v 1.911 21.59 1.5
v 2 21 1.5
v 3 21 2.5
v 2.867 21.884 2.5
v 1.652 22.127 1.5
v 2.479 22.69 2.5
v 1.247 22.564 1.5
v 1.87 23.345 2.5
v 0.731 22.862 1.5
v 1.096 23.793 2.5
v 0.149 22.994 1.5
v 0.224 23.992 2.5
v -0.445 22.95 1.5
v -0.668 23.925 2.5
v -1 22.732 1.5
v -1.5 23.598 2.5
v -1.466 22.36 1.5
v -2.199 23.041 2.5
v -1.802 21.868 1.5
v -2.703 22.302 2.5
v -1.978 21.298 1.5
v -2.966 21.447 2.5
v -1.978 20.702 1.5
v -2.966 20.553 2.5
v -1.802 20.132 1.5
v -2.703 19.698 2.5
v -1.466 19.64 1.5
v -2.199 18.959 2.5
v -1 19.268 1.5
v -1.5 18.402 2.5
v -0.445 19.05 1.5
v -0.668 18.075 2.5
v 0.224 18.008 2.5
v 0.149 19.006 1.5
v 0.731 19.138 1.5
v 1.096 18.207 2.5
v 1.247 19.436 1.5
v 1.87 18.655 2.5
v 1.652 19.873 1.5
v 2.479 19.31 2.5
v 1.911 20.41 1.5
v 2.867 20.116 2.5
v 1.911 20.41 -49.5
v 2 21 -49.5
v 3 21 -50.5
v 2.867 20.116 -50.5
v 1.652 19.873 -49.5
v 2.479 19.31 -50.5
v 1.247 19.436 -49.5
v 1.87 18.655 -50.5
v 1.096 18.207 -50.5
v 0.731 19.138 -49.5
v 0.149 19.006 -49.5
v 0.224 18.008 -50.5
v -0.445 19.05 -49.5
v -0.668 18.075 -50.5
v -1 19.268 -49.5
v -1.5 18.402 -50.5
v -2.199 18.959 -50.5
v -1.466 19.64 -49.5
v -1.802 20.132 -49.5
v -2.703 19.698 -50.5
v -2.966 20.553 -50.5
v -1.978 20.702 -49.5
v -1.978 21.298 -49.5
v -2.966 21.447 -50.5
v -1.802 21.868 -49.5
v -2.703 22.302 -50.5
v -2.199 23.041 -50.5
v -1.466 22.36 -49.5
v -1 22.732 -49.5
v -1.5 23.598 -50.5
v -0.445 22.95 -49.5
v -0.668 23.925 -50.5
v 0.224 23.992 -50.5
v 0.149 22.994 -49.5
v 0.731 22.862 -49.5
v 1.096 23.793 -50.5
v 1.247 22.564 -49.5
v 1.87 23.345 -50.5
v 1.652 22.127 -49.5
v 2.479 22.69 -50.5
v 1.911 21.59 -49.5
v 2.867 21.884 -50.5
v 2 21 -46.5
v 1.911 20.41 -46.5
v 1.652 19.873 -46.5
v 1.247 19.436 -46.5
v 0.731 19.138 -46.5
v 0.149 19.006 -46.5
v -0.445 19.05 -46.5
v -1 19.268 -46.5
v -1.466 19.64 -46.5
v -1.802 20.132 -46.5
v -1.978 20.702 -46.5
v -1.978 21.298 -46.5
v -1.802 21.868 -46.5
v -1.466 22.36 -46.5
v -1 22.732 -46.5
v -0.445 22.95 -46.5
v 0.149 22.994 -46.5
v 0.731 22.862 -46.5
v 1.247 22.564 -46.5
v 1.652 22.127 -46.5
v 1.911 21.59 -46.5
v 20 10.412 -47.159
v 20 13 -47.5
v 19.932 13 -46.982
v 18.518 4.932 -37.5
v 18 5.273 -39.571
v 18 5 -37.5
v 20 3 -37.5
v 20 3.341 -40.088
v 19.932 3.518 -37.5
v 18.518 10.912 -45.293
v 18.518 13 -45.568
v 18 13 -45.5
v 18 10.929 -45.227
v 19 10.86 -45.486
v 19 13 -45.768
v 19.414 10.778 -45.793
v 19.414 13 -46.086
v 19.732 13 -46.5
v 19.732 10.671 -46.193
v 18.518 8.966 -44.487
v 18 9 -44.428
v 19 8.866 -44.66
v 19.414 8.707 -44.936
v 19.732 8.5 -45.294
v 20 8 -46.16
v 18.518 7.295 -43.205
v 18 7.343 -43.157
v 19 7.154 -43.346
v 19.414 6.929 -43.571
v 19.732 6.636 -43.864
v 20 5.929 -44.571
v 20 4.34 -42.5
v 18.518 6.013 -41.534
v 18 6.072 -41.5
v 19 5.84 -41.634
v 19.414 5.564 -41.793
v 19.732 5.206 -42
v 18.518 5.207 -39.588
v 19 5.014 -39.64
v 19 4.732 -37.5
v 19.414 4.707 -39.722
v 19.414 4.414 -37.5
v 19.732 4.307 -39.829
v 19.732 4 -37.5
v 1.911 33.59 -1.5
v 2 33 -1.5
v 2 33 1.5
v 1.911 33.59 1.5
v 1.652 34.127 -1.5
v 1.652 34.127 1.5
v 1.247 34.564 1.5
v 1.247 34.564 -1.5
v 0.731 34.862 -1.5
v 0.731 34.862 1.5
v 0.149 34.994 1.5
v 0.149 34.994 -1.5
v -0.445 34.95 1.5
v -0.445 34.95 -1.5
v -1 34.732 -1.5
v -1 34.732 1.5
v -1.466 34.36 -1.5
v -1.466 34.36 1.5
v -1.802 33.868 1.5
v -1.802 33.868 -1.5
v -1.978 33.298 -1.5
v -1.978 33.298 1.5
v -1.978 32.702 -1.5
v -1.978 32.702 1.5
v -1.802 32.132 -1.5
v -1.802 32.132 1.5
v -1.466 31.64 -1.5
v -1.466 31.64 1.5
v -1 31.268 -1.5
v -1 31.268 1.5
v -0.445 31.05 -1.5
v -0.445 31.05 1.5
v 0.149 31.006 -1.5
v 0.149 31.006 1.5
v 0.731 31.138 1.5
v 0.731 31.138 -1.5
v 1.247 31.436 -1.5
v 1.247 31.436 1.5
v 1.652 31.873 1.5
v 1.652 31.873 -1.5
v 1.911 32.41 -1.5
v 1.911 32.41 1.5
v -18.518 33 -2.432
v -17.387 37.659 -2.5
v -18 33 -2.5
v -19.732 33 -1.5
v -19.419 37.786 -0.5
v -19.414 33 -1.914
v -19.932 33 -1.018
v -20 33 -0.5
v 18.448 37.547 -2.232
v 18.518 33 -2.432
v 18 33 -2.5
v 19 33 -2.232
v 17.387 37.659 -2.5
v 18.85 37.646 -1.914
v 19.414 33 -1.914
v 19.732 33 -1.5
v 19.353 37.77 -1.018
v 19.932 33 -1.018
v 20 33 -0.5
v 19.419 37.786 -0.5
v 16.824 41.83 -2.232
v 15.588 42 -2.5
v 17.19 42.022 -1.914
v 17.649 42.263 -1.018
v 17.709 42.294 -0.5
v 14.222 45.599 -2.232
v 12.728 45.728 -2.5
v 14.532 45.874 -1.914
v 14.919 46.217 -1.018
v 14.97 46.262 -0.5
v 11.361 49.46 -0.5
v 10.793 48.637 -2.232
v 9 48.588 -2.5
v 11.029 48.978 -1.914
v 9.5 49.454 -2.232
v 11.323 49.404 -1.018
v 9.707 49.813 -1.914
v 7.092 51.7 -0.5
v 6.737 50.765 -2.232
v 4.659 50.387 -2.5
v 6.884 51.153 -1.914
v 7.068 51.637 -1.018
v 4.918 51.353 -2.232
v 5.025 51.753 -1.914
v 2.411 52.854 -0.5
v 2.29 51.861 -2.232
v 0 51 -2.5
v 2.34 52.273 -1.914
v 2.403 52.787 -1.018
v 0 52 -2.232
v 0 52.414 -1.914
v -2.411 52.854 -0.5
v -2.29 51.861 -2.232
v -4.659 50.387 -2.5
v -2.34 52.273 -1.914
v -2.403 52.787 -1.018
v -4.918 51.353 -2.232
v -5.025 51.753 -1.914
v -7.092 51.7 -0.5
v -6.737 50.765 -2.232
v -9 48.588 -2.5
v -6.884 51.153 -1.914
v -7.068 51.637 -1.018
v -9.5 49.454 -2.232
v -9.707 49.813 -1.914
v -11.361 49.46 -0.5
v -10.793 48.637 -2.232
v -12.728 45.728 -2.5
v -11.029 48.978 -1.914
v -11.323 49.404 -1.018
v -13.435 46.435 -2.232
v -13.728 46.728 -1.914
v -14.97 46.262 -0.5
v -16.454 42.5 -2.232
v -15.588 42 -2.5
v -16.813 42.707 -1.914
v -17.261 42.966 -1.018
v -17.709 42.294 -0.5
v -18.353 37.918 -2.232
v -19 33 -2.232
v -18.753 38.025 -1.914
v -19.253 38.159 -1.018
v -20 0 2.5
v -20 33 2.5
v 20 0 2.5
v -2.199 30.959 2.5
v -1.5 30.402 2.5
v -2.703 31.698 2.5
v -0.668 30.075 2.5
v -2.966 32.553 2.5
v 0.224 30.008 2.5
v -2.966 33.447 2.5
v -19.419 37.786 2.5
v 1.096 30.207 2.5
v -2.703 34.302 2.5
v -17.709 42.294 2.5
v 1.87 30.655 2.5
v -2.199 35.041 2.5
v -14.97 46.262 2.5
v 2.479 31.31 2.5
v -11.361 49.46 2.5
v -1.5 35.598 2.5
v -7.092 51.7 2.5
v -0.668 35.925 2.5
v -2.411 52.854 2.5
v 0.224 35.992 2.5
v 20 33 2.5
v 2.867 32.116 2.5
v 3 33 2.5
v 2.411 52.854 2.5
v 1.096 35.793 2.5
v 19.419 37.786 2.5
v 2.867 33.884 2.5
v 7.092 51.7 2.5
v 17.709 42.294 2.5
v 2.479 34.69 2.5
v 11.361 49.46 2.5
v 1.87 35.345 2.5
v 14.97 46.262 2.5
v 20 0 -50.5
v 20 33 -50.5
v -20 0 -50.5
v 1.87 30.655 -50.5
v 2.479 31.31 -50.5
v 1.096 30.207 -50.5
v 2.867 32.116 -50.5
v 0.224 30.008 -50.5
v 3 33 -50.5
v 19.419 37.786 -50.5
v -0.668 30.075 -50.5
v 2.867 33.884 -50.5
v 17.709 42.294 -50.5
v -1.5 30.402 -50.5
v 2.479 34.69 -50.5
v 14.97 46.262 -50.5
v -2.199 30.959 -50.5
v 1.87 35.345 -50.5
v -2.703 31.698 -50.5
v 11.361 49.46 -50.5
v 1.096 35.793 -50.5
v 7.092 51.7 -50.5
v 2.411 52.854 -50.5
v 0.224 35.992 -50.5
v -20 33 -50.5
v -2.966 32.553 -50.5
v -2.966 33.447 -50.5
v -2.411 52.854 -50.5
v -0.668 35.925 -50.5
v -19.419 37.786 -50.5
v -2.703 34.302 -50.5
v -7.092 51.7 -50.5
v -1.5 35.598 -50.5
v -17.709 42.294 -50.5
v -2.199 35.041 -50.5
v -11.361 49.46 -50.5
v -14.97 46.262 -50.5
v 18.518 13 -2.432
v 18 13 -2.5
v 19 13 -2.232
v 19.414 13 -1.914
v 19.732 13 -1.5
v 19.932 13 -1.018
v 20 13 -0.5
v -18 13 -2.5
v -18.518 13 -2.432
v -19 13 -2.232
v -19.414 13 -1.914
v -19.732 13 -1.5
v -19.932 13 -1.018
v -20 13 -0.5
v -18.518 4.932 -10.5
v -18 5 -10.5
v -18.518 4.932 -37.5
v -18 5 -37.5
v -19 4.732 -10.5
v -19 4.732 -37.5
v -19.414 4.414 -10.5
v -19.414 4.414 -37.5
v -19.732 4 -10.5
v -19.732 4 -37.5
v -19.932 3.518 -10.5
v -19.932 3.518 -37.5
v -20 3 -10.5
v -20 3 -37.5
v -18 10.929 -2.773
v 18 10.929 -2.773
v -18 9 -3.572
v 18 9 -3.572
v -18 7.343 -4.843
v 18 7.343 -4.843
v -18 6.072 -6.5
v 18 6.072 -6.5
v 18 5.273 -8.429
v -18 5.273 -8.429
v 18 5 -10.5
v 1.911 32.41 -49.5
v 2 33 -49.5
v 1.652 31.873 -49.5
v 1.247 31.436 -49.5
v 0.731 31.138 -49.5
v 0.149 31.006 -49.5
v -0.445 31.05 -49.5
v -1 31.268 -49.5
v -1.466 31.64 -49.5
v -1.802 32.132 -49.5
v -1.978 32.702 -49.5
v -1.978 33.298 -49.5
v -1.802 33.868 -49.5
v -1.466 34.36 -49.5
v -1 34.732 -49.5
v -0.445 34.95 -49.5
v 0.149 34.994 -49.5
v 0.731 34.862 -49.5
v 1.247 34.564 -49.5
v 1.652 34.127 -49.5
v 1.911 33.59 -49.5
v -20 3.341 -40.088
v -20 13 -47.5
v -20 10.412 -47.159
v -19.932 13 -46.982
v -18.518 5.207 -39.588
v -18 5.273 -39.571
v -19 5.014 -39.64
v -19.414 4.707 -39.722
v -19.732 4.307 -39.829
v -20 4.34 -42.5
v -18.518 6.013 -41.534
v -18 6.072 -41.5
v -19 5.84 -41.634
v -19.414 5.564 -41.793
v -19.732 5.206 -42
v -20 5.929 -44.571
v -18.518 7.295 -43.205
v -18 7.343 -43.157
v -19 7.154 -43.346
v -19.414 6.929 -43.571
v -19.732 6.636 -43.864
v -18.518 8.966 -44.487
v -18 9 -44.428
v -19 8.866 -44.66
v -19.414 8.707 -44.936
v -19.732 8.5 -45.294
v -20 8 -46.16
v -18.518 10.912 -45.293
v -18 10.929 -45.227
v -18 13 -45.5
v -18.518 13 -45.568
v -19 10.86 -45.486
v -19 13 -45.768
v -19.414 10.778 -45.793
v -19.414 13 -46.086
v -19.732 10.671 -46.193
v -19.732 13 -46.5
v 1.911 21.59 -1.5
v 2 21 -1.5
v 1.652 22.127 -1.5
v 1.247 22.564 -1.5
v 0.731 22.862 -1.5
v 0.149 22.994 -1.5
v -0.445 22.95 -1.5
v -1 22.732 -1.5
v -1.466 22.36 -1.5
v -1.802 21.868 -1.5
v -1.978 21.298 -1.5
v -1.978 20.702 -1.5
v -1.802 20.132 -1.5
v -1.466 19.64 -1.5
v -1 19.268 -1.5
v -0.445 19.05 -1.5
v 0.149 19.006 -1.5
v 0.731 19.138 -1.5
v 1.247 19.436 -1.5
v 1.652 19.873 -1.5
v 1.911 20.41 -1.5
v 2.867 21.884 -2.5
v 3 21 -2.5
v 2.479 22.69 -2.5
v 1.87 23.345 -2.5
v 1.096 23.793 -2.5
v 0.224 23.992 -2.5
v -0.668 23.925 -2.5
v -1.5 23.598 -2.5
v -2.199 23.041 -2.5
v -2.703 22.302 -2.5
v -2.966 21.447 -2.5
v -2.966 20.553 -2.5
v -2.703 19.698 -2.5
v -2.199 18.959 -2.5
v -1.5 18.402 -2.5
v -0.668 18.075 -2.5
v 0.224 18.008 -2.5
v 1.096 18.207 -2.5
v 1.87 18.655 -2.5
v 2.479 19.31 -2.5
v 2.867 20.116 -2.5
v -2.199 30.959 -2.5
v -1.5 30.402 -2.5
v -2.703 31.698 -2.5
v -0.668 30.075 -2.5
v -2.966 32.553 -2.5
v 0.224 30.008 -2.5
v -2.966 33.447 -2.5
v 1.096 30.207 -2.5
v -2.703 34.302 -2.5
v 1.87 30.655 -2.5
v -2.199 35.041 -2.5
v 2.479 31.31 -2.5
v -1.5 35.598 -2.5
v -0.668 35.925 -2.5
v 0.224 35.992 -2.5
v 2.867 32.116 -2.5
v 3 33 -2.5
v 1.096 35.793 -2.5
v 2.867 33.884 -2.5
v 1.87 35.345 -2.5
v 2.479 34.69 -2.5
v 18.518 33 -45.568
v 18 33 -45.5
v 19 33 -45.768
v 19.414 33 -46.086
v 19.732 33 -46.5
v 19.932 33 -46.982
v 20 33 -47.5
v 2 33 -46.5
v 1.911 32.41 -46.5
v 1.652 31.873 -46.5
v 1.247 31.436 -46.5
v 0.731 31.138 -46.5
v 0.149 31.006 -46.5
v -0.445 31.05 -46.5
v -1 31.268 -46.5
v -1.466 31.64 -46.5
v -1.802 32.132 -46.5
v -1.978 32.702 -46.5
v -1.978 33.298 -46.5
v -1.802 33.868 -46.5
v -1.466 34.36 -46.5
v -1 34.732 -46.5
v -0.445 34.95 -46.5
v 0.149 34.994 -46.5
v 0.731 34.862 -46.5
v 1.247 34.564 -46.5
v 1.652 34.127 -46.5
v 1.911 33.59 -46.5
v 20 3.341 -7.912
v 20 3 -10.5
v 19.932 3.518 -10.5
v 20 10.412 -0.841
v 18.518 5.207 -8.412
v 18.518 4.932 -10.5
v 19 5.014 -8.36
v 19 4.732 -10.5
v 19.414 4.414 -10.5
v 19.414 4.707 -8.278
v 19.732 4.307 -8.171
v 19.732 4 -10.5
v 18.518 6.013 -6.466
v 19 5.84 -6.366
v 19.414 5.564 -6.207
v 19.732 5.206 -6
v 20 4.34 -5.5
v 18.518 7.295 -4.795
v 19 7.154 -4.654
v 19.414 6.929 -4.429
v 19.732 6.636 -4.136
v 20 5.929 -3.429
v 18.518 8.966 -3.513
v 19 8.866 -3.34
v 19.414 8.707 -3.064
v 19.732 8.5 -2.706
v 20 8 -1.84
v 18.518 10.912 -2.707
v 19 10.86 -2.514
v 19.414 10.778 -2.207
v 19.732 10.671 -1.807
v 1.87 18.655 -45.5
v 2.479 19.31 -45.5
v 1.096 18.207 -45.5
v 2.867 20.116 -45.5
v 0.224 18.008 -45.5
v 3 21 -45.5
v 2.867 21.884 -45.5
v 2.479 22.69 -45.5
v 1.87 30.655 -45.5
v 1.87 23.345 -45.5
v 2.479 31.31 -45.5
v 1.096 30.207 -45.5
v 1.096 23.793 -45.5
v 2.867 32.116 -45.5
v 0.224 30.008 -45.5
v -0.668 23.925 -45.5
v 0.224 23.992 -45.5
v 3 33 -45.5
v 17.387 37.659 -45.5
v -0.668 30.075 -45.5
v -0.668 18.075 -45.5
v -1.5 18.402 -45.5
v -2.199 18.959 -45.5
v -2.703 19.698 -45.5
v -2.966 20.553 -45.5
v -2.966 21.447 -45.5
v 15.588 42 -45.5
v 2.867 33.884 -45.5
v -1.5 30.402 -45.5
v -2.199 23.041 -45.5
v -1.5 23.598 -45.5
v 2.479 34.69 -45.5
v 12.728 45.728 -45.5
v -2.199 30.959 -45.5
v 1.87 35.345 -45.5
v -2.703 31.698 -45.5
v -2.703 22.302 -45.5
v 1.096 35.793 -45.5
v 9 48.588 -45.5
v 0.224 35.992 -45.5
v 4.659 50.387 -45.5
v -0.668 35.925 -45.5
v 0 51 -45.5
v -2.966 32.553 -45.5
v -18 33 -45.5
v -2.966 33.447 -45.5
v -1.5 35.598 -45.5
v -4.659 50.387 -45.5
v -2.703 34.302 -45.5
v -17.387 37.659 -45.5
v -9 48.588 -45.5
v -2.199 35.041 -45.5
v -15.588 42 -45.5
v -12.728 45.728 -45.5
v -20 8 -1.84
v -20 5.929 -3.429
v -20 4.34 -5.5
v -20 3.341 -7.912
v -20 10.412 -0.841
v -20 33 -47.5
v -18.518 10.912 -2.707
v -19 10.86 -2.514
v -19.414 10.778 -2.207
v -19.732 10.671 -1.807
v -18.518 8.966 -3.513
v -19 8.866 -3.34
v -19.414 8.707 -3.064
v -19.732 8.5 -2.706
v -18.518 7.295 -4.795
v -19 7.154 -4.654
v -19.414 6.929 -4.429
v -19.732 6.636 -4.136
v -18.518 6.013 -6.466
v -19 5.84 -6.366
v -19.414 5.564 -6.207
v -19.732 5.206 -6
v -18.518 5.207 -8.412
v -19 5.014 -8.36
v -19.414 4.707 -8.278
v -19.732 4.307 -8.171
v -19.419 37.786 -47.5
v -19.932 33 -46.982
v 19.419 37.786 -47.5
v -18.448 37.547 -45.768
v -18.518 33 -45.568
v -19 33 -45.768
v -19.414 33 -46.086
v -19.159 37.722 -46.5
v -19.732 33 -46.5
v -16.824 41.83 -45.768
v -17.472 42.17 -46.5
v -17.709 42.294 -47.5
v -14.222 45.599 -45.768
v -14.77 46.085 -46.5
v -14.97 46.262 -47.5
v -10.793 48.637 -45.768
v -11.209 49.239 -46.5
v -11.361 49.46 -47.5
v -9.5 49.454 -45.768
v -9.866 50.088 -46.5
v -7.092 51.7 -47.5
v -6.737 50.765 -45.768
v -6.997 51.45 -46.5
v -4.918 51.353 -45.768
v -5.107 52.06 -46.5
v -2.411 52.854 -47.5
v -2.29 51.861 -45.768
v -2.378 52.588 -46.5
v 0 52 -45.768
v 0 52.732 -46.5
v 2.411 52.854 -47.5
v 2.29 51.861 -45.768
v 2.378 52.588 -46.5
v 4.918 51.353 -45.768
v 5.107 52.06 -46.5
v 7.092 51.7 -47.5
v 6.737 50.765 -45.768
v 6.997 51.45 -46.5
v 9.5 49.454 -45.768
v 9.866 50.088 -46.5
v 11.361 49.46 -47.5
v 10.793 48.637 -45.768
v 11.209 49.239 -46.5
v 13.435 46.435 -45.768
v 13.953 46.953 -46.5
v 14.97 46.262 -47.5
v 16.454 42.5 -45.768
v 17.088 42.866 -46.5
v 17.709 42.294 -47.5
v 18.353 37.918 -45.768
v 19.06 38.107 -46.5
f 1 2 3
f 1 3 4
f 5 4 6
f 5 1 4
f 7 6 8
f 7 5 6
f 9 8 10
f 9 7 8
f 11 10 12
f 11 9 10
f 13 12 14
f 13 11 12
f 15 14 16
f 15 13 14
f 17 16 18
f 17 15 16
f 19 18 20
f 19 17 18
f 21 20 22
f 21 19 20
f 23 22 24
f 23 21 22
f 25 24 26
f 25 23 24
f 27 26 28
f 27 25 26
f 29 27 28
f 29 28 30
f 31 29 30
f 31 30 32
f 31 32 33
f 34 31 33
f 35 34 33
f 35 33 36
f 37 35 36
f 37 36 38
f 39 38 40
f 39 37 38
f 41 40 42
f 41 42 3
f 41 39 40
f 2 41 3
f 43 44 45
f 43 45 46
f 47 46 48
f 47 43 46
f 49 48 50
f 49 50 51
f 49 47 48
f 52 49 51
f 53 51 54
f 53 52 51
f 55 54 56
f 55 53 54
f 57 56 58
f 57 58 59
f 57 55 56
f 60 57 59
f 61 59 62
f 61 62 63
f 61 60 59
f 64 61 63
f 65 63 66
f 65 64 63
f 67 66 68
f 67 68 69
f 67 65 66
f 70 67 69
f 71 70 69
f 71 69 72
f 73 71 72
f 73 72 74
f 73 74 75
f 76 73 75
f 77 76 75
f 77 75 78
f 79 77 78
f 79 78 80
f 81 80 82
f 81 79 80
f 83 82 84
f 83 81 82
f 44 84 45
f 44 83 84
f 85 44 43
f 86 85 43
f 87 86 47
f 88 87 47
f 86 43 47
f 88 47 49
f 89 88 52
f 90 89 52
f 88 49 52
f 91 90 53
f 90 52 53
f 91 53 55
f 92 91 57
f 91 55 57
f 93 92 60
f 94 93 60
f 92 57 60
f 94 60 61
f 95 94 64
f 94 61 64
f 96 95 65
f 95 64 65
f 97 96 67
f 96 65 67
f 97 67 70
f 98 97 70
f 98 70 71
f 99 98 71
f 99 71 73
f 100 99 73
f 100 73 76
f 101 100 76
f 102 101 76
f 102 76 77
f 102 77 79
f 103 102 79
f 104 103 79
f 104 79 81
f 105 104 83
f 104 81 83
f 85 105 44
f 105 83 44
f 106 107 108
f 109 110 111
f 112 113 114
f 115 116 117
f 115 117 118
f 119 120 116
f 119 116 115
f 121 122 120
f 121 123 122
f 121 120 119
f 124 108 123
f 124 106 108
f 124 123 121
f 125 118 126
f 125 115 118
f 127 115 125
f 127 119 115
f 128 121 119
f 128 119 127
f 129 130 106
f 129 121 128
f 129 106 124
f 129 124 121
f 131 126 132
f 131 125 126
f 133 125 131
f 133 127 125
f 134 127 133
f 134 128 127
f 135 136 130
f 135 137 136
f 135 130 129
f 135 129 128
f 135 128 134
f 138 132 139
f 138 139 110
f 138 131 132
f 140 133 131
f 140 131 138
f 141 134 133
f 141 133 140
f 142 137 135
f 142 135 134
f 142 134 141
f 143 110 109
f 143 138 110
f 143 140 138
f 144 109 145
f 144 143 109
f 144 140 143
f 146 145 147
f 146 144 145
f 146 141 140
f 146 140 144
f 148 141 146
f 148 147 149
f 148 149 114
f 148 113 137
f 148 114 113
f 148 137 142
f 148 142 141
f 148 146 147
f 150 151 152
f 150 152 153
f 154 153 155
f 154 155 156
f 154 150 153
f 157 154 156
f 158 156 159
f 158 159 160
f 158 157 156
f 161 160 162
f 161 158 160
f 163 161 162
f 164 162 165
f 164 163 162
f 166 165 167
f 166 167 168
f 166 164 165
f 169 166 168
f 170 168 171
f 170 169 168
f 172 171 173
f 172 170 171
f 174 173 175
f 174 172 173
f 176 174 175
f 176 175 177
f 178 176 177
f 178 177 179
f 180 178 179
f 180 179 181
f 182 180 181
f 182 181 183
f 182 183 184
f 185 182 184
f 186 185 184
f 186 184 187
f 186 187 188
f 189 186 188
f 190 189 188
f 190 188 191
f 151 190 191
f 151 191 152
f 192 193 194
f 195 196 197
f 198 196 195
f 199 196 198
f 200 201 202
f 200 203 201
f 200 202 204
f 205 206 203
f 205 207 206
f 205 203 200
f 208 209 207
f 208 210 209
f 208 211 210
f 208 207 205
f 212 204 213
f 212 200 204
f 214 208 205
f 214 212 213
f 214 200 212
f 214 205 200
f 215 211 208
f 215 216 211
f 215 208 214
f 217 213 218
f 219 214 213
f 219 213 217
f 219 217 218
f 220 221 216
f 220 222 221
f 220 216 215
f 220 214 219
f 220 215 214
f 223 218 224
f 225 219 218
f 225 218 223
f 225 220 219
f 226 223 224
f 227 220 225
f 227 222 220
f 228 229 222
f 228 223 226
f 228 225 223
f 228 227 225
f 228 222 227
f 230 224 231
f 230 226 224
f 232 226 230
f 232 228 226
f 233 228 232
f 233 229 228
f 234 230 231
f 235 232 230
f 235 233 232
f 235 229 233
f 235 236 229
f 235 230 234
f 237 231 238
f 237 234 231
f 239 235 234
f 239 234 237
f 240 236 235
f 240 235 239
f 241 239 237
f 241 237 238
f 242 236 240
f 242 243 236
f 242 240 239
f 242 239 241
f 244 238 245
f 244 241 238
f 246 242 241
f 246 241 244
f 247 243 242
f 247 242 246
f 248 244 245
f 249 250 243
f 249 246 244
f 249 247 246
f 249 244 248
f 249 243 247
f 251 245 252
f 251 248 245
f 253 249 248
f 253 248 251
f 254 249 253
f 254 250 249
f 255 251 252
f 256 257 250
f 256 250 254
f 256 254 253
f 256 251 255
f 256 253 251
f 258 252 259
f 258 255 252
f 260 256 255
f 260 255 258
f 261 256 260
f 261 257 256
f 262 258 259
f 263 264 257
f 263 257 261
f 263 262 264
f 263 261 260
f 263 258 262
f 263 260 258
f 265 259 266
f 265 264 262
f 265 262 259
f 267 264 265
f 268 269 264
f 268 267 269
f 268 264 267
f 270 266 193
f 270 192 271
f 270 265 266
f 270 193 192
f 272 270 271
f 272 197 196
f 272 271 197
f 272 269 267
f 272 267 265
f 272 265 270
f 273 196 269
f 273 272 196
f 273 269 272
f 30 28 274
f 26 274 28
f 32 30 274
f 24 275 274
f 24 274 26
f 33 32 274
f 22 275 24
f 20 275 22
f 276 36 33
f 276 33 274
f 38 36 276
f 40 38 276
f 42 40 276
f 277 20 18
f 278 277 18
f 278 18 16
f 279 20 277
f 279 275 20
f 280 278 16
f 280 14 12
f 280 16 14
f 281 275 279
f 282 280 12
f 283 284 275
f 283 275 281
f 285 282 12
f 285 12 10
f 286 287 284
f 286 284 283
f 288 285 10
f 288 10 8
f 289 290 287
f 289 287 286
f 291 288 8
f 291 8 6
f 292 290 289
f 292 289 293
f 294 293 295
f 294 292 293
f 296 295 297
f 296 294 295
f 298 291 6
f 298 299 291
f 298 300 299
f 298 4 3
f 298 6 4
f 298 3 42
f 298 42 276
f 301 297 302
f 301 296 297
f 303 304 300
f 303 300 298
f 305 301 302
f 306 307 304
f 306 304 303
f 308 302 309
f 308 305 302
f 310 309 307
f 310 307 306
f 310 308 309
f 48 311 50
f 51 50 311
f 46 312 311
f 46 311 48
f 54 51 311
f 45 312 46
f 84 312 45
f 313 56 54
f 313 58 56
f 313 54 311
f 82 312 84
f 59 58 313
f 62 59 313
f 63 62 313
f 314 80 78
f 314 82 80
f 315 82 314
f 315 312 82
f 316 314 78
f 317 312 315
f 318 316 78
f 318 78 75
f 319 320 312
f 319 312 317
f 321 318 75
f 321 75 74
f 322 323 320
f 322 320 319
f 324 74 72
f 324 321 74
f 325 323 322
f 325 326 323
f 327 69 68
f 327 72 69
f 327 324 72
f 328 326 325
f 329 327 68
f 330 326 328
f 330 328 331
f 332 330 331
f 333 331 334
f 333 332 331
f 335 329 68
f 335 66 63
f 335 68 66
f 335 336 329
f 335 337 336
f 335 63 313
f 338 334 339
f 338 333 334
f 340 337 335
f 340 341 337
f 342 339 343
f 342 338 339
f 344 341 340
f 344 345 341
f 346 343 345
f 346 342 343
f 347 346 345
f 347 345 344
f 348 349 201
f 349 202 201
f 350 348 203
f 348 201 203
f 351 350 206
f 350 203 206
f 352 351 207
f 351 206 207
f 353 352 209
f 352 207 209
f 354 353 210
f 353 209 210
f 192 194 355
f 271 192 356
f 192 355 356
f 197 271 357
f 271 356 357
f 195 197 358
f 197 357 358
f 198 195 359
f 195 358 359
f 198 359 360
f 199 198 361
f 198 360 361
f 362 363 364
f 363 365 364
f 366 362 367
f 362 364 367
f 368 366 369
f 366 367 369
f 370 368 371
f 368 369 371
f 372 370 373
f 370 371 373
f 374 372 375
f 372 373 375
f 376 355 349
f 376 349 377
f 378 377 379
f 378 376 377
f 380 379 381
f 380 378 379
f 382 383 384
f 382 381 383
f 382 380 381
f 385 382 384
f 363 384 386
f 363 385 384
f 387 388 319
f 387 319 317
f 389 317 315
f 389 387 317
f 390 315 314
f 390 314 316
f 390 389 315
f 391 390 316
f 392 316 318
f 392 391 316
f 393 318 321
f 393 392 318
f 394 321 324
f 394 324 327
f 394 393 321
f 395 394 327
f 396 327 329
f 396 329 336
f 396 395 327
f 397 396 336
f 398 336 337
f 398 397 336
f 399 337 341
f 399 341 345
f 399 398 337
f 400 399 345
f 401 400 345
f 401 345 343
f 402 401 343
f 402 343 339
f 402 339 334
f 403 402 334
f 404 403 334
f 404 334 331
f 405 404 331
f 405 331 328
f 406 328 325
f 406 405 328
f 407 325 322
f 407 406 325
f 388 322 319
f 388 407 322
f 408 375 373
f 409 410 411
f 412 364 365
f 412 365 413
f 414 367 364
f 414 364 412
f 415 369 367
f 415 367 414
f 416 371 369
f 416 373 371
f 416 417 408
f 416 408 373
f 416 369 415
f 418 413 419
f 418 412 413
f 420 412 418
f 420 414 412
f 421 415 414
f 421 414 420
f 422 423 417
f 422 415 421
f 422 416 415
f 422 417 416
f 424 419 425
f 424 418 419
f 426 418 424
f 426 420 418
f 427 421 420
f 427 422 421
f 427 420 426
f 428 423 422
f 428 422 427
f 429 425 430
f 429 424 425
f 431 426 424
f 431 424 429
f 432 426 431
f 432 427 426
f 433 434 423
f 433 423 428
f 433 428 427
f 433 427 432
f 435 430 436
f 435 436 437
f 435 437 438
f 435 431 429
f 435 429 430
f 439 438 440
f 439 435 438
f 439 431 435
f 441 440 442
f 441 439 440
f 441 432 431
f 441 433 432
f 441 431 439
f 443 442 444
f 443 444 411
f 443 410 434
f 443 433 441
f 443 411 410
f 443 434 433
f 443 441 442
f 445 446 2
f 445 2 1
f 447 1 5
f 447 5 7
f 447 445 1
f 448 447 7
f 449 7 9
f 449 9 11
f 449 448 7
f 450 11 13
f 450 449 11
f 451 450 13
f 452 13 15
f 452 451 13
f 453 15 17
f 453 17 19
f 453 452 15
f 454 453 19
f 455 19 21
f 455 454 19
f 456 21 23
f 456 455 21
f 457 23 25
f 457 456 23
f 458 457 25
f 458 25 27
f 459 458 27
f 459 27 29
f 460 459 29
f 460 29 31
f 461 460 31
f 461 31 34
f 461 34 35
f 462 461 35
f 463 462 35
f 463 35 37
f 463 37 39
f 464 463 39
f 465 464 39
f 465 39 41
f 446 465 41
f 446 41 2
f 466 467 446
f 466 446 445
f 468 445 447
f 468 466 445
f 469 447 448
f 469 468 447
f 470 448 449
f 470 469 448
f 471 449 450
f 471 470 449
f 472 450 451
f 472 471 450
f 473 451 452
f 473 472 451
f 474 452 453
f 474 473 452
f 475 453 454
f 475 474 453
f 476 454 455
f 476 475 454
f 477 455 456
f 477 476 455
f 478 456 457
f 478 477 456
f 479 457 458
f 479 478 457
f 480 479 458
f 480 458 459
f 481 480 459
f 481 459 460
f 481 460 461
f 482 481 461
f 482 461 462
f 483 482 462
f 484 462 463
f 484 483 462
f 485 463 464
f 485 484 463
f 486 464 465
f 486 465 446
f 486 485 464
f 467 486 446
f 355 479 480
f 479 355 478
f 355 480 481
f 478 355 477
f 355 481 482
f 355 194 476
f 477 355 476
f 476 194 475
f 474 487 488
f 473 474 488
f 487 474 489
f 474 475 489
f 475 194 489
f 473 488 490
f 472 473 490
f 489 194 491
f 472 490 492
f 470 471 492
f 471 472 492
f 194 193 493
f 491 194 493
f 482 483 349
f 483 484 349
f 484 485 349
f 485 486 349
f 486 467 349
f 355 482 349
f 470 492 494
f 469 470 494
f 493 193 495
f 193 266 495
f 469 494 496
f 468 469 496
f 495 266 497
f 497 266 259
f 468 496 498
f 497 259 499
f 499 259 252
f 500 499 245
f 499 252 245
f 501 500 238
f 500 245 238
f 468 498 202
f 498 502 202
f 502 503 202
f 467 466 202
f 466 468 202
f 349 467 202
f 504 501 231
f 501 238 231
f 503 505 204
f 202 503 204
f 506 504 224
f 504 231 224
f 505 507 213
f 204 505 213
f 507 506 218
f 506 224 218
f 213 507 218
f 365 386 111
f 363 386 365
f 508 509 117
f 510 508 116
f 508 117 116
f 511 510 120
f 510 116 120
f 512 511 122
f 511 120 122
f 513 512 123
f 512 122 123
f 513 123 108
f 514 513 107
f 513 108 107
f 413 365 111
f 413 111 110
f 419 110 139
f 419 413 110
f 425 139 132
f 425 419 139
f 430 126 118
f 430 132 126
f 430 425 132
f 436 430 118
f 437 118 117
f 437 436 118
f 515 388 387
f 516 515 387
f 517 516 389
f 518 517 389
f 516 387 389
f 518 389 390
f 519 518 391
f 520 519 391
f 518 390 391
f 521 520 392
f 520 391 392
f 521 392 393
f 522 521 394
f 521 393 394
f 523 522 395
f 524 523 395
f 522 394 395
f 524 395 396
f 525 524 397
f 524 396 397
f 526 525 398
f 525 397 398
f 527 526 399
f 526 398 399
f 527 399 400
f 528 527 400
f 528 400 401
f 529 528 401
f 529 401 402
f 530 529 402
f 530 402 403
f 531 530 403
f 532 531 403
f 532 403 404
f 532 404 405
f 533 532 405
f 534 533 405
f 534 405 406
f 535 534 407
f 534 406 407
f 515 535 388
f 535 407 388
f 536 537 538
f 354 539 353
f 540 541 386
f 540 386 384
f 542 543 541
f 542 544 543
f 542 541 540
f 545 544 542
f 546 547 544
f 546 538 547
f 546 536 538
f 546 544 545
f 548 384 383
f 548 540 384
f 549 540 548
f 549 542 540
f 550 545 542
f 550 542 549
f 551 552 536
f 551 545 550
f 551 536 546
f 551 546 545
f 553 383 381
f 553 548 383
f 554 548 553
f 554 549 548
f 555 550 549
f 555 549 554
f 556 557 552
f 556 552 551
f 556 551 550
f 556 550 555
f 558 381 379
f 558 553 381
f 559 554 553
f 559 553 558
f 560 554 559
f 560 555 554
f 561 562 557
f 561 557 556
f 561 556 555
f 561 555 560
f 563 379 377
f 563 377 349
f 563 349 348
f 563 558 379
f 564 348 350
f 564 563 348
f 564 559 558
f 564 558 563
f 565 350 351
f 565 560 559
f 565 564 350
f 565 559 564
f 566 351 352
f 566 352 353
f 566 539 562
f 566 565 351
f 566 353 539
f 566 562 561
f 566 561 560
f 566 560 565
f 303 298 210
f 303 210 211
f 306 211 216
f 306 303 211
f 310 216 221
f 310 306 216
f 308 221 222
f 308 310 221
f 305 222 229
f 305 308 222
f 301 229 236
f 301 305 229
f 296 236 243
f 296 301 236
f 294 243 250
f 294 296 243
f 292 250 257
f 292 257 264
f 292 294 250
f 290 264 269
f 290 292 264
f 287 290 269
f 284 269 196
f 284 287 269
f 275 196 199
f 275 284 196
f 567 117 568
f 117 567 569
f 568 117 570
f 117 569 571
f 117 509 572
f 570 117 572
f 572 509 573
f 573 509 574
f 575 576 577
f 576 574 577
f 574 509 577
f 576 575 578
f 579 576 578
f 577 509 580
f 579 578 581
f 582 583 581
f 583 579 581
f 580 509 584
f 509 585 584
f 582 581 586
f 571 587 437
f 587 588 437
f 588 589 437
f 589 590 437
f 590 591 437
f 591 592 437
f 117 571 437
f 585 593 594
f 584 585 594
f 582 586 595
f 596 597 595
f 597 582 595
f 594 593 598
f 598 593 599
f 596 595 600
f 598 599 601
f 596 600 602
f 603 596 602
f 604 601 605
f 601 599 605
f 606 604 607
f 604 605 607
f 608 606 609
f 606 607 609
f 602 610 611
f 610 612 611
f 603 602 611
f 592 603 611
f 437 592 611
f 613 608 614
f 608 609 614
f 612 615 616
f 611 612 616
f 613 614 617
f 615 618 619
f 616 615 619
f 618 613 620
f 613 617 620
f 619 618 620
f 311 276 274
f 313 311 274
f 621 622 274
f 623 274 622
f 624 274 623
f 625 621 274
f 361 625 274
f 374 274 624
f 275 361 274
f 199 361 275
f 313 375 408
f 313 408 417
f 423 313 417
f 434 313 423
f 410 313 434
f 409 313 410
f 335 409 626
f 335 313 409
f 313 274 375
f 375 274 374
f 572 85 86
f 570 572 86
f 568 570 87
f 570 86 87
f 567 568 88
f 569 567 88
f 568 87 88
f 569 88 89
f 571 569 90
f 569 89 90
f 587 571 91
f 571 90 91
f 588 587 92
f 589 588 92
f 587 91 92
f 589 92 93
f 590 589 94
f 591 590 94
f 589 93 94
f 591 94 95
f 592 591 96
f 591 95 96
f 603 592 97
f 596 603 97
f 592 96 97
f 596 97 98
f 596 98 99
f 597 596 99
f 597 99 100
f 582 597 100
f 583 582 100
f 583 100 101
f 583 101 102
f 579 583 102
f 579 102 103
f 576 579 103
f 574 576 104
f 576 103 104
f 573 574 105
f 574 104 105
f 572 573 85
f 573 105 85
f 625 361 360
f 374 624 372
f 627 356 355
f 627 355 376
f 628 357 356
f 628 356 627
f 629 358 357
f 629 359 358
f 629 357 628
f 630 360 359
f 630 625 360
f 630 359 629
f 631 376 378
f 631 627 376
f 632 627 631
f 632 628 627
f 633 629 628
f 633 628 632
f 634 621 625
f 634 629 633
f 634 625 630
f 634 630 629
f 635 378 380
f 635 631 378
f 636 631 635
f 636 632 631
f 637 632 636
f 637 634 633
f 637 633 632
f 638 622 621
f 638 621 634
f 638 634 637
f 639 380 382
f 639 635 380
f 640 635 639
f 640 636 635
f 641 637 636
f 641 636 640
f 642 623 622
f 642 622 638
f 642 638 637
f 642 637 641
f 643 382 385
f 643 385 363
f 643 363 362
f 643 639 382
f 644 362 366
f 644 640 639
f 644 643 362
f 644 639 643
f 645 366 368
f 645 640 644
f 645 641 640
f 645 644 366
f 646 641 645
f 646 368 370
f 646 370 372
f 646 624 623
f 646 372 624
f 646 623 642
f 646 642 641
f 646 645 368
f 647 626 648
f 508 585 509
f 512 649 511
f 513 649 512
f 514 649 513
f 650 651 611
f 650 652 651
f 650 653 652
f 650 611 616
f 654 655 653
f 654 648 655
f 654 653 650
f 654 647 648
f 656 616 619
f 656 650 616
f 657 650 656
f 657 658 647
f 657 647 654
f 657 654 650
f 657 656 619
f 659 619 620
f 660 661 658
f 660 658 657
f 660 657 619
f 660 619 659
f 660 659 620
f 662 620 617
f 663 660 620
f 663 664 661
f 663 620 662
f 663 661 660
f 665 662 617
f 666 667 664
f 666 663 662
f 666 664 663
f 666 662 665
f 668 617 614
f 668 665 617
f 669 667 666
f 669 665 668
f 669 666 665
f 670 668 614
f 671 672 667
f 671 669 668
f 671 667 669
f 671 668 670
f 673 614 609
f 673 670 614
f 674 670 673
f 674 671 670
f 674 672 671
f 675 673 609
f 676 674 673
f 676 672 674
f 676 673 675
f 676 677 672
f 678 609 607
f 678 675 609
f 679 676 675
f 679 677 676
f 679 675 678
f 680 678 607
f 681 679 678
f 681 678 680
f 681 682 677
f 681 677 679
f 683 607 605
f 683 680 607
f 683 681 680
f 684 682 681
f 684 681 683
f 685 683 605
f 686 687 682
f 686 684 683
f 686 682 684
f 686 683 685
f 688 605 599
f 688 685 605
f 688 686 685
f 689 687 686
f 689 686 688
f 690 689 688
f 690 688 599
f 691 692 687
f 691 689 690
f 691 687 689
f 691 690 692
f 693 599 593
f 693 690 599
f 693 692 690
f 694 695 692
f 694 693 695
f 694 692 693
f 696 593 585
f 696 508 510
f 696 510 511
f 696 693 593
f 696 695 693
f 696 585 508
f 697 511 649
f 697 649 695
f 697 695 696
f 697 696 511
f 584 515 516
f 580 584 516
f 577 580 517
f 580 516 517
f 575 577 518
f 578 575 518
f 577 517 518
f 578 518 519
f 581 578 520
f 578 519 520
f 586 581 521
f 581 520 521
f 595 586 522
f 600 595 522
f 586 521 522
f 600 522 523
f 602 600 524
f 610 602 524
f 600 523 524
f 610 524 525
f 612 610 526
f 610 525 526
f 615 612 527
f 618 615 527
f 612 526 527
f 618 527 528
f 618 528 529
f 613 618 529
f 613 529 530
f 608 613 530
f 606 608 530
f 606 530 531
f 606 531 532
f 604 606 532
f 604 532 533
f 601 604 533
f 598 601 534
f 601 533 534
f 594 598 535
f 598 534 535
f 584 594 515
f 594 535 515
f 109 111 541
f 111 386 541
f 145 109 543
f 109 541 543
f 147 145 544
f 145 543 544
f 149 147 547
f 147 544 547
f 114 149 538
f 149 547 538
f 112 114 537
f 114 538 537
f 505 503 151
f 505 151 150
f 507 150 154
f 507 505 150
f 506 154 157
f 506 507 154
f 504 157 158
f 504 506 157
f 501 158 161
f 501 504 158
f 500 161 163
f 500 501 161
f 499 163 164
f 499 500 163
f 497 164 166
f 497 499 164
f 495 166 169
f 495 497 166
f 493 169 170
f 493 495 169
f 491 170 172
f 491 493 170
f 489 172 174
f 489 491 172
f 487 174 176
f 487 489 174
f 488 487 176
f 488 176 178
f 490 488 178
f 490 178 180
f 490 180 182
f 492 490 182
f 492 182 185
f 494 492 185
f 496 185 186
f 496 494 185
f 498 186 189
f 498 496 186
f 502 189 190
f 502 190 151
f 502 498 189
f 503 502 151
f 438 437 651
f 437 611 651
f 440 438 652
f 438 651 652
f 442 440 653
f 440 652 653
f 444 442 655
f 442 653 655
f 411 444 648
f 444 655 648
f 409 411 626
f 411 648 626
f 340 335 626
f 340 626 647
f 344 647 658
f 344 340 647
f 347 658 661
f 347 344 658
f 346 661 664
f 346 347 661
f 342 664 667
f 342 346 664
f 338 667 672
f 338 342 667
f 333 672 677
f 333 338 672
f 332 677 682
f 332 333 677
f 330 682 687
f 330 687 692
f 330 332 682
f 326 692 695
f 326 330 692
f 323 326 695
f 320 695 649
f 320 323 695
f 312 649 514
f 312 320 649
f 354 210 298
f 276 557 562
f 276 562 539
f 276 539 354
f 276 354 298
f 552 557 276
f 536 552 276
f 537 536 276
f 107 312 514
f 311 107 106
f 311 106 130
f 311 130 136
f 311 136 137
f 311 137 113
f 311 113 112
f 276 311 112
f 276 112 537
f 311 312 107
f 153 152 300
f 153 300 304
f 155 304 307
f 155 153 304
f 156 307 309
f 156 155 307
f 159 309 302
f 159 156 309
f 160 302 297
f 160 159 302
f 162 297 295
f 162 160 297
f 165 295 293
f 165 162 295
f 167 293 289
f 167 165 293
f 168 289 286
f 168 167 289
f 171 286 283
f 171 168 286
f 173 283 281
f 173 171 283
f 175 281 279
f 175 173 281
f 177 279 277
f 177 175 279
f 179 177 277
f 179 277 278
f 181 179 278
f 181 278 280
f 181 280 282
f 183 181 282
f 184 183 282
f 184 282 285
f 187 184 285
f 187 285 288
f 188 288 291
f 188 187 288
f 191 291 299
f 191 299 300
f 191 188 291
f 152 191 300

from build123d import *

# Parameters (mm, degrees)
SKETCH1_R           = 2
BOSS_EXTRUDE1_DEPTH = 2.5
BOSS_EXTRUDE2_START = -5
SKETCH2_W           = 40
SKETCH2_H           = 5
BOSS_EXTRUDE2_DEPTH = 53
SKETCH3_R           = 2
BOSS_EXTRUDE3_DEPTH = 5
FILLET2_R           = 8
FILLET1_R           = 2
CHAMFER1_SIZE       = 1


with BuildPart() as part:
    # Sketch1 → Boss-Extrude1 (new, symmetric)
    with BuildSketch(Plane.XY):
        with BuildLine():
            Line((-20, 0), (20, 0))
            Line((20, 0), (20, 33))
            ThreePointArc((20, 33), (0, 53), (-20, 33))
            Line((-20, 33), (-20, 0))
        make_face()
        with Locations((0, 33)):
            Circle(SKETCH1_R, mode=Mode.SUBTRACT)
        with Locations((0, 21)):
            Circle(SKETCH1_R, mode=Mode.SUBTRACT)
    extrude(amount=BOSS_EXTRUDE1_DEPTH, both=True)

    # Sketch2 → Boss-Extrude2 (add)
    with BuildSketch(Plane(origin=(0, 0, -2.5), x_dir=(-1, 0, 0), z_dir=(0, 0, -1)).offset(BOSS_EXTRUDE2_START)):
        with Locations((0, 2.5)):
            Rectangle(SKETCH2_W, SKETCH2_H)
    extrude(amount=BOSS_EXTRUDE2_DEPTH)

    # Sketch3 → Boss-Extrude3 (add)
    with BuildSketch(Plane(origin=(0, 0, -50.5), x_dir=(-1, 0, 0), z_dir=(0, 0, -1))):
        with BuildLine():
            Line((-20, 33), (-20, 5))
            Line((-20, 5), (20, 5))
            Line((20, 5), (20, 33))
            ThreePointArc((20, 33), (0, 53), (-20, 33))
        make_face()
        with Locations(Location((0, 21, 0), (0, 0, 180))):
            Circle(SKETCH3_R, mode=Mode.SUBTRACT)
        with Locations(Location((0, 33, 0), (0, 0, 180))):
            Circle(SKETCH3_R, mode=Mode.SUBTRACT)
    extrude(amount=-BOSS_EXTRUDE3_DEPTH)

    # Fillet2
    fillet2_edges = [part.edges().sort_by_distance(p)[0] for p in [
        (0, 5, -2.5),
        (0, 5, -45.5),
    ]]
    fillet(fillet2_edges, radius=FILLET2_R)

    # Fillet1
    fillet1_edges = [part.edges().sort_by_distance(p)[0] for p in [
        (0, 53, -45.5),
        (20, 23, -45.5),
        (-20, 23, -2.5),
        (-20, 5, -24),
        (20, 5, -24),
        (0, 53, -2.5),
        (-20, 23, -45.5),
        (20, 23, -2.5),
        (-20, 7.343145751, -43.156854249),
        (20, 7.343145751, -43.156854249),
        (-20, 7.343145751, -4.843145751),
        (20, 7.343145751, -4.843145751),
    ]]
    fillet(fillet1_edges, radius=FILLET1_R)

    # Chamfer1
    chamfer1_edges = [part.edges().sort_by_distance(p)[0] for p in [
        (-2, 33, -2.5),
        (-2, 33, 2.5),
        (-2, 21, -2.5),
        (-2, 21, 2.5),
        (-2, 33, -45.5),
        (-2, 21, -45.5),
        (-2, 21, -50.5),
        (-2, 33, -50.5),
    ]]
    chamfer(chamfer1_edges, length=CHAMFER1_SIZE)


solid = part.part
